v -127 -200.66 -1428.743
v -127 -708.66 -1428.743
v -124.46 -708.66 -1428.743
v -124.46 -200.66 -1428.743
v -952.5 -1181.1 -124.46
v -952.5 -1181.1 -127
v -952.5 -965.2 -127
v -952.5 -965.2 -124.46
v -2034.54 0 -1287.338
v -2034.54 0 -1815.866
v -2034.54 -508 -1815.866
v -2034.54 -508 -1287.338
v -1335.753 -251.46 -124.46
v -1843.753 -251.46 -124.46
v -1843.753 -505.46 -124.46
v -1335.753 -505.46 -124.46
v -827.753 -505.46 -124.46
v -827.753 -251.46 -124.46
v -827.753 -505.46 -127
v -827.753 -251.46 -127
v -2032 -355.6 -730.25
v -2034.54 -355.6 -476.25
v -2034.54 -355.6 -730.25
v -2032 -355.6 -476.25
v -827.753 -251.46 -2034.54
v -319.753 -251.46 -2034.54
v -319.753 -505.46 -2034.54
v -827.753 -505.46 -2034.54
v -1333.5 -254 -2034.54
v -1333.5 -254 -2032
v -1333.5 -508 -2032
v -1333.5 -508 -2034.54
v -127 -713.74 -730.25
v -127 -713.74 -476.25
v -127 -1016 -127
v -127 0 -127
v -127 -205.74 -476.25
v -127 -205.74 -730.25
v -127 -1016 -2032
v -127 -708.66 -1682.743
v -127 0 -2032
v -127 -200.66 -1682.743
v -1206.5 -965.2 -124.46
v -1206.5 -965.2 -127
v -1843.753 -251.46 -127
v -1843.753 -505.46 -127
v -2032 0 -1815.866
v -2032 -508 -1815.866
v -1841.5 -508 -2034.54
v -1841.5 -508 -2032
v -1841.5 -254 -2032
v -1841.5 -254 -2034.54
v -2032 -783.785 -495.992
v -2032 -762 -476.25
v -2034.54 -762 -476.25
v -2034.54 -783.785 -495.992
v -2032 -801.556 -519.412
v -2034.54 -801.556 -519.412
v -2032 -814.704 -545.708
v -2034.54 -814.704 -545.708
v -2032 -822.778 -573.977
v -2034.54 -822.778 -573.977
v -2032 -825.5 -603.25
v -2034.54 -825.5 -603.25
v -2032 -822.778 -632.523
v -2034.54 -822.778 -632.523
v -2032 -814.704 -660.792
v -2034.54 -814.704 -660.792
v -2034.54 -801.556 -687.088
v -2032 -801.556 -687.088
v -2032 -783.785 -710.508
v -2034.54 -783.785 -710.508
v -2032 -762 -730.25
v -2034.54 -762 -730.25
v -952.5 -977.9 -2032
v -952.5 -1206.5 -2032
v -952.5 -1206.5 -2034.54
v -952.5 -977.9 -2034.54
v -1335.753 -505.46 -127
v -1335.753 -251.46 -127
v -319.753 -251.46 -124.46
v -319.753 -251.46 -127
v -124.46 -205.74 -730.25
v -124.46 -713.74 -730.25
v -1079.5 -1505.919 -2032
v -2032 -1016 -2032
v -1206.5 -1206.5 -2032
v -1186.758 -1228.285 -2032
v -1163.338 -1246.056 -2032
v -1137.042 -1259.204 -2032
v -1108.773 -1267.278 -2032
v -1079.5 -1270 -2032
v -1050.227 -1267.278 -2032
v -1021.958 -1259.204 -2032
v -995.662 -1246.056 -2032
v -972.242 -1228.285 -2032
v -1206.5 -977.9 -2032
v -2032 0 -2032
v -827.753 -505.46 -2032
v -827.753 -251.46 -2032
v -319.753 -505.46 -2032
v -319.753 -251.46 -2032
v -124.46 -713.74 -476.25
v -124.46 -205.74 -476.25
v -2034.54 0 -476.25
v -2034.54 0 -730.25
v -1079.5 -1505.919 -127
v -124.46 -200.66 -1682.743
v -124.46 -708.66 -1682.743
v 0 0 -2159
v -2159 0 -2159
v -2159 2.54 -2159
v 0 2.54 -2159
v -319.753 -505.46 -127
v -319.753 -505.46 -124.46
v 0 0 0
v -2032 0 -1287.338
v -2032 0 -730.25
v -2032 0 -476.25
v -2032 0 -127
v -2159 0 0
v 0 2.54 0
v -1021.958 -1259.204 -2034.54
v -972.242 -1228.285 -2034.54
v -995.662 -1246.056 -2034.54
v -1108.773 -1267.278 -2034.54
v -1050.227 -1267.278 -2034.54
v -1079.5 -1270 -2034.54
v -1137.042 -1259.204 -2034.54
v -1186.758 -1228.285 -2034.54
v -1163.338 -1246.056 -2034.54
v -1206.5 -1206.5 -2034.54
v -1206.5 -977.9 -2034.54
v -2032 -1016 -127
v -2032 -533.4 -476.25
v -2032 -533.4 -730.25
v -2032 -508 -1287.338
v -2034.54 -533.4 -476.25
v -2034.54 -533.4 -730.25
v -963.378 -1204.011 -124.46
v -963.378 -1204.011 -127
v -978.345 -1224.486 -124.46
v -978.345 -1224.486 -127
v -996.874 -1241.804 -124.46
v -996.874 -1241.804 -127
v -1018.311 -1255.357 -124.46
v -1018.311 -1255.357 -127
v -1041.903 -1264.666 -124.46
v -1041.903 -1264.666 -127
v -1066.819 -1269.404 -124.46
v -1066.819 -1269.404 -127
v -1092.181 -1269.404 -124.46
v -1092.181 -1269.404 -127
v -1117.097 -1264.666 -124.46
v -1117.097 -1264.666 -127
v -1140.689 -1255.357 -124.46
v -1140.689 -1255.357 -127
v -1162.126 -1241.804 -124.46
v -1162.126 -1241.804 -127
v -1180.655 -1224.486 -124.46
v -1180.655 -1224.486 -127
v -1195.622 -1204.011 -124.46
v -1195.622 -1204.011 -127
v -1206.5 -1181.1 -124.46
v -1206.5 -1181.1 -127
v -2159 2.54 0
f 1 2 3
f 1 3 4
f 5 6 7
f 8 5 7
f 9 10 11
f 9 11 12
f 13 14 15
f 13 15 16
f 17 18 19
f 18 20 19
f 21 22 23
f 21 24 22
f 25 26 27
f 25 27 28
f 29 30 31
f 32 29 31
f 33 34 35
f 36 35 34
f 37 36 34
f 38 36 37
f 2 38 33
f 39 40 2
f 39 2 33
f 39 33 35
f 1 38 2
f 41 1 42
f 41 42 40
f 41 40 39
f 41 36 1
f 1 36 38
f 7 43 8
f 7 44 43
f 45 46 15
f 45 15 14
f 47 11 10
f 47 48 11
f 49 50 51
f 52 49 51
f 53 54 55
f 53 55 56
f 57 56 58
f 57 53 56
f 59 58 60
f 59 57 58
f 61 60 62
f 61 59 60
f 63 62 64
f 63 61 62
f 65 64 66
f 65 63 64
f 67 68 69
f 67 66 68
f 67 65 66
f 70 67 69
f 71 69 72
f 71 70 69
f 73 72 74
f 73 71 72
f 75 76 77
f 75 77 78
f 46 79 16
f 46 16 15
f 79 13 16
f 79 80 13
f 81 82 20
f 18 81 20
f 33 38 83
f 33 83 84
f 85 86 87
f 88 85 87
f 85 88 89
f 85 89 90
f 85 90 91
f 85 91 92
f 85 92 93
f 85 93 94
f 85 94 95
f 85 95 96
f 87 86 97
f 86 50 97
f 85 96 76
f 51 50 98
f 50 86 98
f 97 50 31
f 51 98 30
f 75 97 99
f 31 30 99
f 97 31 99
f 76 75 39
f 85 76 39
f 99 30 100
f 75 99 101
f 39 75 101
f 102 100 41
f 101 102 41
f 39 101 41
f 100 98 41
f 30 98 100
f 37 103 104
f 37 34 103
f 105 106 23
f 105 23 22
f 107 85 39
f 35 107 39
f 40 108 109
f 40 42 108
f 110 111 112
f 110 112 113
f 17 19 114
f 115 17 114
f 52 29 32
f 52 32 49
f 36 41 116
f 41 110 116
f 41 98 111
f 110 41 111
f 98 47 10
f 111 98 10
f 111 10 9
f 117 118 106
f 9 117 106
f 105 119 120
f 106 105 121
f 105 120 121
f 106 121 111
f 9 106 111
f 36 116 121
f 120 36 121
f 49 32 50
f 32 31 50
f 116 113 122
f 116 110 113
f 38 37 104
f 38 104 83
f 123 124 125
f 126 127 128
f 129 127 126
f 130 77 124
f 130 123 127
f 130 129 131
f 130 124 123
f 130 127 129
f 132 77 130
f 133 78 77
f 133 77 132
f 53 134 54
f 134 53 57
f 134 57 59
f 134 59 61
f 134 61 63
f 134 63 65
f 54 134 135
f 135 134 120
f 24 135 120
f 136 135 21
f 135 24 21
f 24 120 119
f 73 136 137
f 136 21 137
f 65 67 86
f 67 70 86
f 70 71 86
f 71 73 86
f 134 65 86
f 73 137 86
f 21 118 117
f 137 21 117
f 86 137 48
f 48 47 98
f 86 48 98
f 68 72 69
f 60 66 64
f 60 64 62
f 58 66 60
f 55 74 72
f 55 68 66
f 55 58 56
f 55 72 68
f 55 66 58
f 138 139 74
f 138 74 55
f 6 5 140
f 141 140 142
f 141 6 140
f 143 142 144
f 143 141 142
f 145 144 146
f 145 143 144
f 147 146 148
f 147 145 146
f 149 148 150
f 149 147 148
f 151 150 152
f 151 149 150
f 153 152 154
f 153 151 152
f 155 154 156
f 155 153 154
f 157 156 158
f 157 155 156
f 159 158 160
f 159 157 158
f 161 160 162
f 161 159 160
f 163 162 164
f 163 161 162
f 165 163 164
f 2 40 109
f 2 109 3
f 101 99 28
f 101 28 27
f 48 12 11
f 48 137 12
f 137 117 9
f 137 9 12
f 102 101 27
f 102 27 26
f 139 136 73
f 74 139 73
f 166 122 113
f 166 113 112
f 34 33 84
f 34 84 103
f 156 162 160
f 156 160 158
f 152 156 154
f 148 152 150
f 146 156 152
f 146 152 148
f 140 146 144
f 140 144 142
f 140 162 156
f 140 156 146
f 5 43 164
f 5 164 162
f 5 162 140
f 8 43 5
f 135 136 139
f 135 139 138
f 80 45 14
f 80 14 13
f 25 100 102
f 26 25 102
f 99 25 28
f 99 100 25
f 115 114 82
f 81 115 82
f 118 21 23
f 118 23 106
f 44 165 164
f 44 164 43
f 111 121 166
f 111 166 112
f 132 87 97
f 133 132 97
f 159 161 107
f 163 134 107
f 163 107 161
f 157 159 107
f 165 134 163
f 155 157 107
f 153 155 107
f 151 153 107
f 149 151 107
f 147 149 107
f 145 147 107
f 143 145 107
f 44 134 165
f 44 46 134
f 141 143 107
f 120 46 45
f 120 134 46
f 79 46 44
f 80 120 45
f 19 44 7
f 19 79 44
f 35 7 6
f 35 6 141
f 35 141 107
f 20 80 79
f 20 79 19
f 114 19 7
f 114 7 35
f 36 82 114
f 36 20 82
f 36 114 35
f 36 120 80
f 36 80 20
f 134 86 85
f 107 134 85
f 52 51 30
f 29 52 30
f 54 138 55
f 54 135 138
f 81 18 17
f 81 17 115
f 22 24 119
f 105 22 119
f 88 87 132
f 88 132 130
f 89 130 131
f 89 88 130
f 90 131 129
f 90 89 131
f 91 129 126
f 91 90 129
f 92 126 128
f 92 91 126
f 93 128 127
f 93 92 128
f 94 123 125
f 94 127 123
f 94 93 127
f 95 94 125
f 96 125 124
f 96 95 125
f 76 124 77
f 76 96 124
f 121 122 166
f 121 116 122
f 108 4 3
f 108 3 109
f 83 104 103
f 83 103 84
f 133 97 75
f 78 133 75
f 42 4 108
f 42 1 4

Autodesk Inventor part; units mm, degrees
ref_plane "YZ Plane" through (0, 0, 0) normal (1, 0, 0) x (0, 1, 0)
ref_plane "XZ Plane" through (0, 0, 0) normal (0, 1, 0) x (-1, 0, 0)
ref_plane "XY Plane" through (0, 0, 0) normal (0, 0, 1) x (1, 0, 0)
sketch "Sketch2" plane through (0, 0, 0) normal (0, 1, 0) x (-1, 0, 0)
  line L0 (0, 0) -> (2159, 0)
  line L1 (2159, 0) -> (2159, -2159)
  line L2 (2159, -2159) -> (0, -2159)
  line L3 (0, -2159) -> (0, 0)
  dimension "d3" = 2159
  dimension "d4" = 2159
  dimension "d5" = 2159
  dimension "d6" = 2159
sketch "Sketch4" plane through (0, 0, 0) normal (0, 1, 0) x (-1, 0, 0)
  line L0 (0, 0) -> (0, -127)
  line L1 (2032, -127) -> (2032, -2032)
  line L2 (2032, -127) -> (127, -127)
  line L3 (127, -127) -> (127, -2032)
  line L4 (2032, -2032) -> (127, -2032)
  dimension "d16" = 127
  dimension "d17" = 2032
  dimension "d18" = 1905
  dimension "d20" = 1905
  dimension "d21" = 1905
extrude "Extrusion3" add sketch "Sketch4" against normal blind 1016
sketch "Sketch5" plane through (-127, 0, -2032) normal (0, 0, -1) x (-1, 0, 0)
  point P0 (-127, 0)
sketch "Sketch6" plane through (-2032, 0, -2032) normal (-1, 0, 0) x (0, 0, 1)
  line L0 (0, 0) -> (952.5, 0)
  line L1 (1905, 0) -> (0, 0) projected
  line L2 (952.5, 0) -> (952.5, -1016)
  line L3 (1905, -1016) -> (0, -1016) projected
  line L4 (952.5, 0) -> (1428.75, 0)
  line L5 (1428.75, 0) -> (1428.75, -355.6)
  line L6 (744.6615, 0) -> (744.6615, -508)
  line L7 (744.6615, -508) -> (216.1341, -508)
  line L8 (216.1341, -508) -> (216.1341, 0)
  line L9 (1428.75, -355.6) -> (1301.75, -355.6)
  line L10 (1301.75, -355.6) -> (1301.75, 0)
  line L11 (1428.75, -355.6) -> (1555.75, -355.6)
  line L12 (1555.75, -355.6) -> (1555.75, 0)
  point P0 (2032, 0)
  dimension "d24" = 476.25
  dimension "d25" = 355.6
  dimension "d26" = 127
  dimension "d27" = 127
extrude "Extrusion4" add sketch "Sketch6" along normal blind 2.54 contours L1 L5 L9 L10 | L1 L12 L11 L5
extrude "Extrusion5" add sketch "Sketch6" along normal blind 2.54 contours L0 L6 L7 L8
sketch "Sketch7" plane through (-127, 0, -2032) normal (0, 0, -1) x (-1, 0, 0)
  line L0 (1905, 0) -> (1905, -1016) projected
  line L1 (1905, 0) -> (0, 0) projected
  line L2 (952.5, 0) -> (952.5, -2181.7197)
  line L3 (1905, -1016) -> (952.5, -1505.9188)
  line L4 (1905, -1016) -> (0, -1016) projected
  line L5 (952.5, -1505.9188) -> (0, -1016)
  line L6 (1905, -1016) -> (0, -1016)
  point P0 (-127, 0)
extrude "Extrusion6" add sketch "Sketch7" against normal blind 1905 contours L3 L2 L4 | L5 L4 L2
extrude "Extrusion7" add sketch "Sketch2" along normal blind 2.54
sketch "Sketch9" plane through (-2032, 0, -127) normal (0, 0, 1) x (1, 0, 0)
  line L0 (-127, 2.54) -> (2032, 2.54) projected
  line L1 (-2.2534, 2.54) -> (950.2466, 2.54)
  line L2 (950.2466, 2.54) -> (950.2466, -864.9635)
  line L3 (950.2466, 2.54) -> (950.2466, -251.46)
  line L4 (950.2466, -251.46) -> (950.2466, -505.46)
  line L5 (696.2466, -251.46) -> (696.2466, -505.46)
  line L6 (696.2466, -505.46) -> (188.2466, -505.46)
  line L7 (188.2466, -505.46) -> (188.2466, -251.46)
  line L8 (188.2466, -251.46) -> (696.2466, -251.46)
  line L9 (1204.2466, -251.46) -> (1204.2466, -505.46)
  line L10 (1204.2466, -505.46) -> (1712.2466, -505.46)
  line L11 (1712.2466, -505.46) -> (1712.2466, -251.46)
  line L12 (1712.2466, -251.46) -> (1204.2466, -251.46)
  point P0 (2032, 0)
  dimension "d40" = 952.5
  dimension "d41" = 254
  dimension "d46" = 254
  dimension "d47" = 508
  dimension "d48" = 254
  dimension "d49" = 254
  dimension "d51" = 508
  dimension "d52" = 254
extrude "Extrusion8" add sketch "Sketch9" along normal blind 2.54
sketch "Sketch10" plane through (-2032, 0, -127) normal (0, 0, 1) x (1, 0, 0)
  line L0 (0, 0) -> (0, -355.6) projected
  line L1 (0, 0) -> (952.5, 0)
  line L2 (1905, 0) -> (0, 0) projected
  line L3 (952.5, 0) -> (952.5, -1143)
  line L4 (952.5, -1143) -> (952.5, -1270)
  line L5 (825.5, -965.2) -> (1079.5, -965.2)
  arc A0 (825.5, -1181.1) -> (1079.5, -1181.1) centre (952.5, -1134.8357) ccw
  line L6 (1079.5, -1181.1) -> (1079.5, -965.2)
  line L7 (825.5, -1181.1) -> (825.5, -965.2)
  point P0 (2032, 0)
  dimension "d55" = 952.5
  dimension "d56" = 1143
  dimension "d58" = 127
extrude "Extrusion9" add sketch "Sketch10" along normal blind 2.54
sketch "Sketch11" plane through (-127, -1016, -127) normal (1, 0, 0) x (0, 0, -1)
  line L0 (0, 1016) -> (349.25, 1016) projected
  line L1 (0, 1016) -> (476.25, 1016)
  line L2 (476.25, 1016) -> (952.5, 1016)
  line L3 (952.5, 1016) -> (1428.7432, 1018.54)
  line L4 (2032, 1018.54) -> (-127, 1018.54) projected
  line L5 (1905, 1016) -> (1905, 0) projected
  line L6 (1428.7432, 1018.54) -> (1905, 1016)
  line L7 (1428.7432, 1018.54) -> (1428.7432, 0)
  line L8 (952.5, 1016) -> (952.5, 0)
  line L9 (476.25, 1016) -> (476.25, 0)
  line L10 (1428.7432, 1018.54) -> (1428.7432, 815.34)
  line L11 (1428.7432, 815.34) -> (1555.7432, 815.34)
  line L12 (1555.7432, 815.34) -> (1555.7432, 307.34)
  line L13 (1555.7432, 307.34) -> (1301.7432, 307.34)
  line L14 (1301.7432, 307.34) -> (1301.7432, 815.34)
  line L15 (1428.7432, 815.34) -> (1301.7432, 815.34)
  line L16 (476.25, 1013.46) -> (476.25, 810.26)
  line L17 (476.25, 810.26) -> (603.25, 810.26)
  line L18 (603.25, 810.26) -> (603.25, 302.26)
  line L19 (603.25, 302.26) -> (349.25, 302.26)
  line L20 (476.25, 810.26) -> (349.25, 810.26)
  line L21 (-127, 1016) -> (-127, 1018.54) projected
  line L22 (349.25, 302.26) -> (349.25, 810.26)
  dimension "d66" = 476.25
  dimension "d67" = 476.25
  dimension "d68" = 476.25
  dimension "d70" = 127
  dimension "d74" = 254
  dimension "d75" = 508
  dimension "d76" = 203.2
  dimension "d77" = 127
  dimension "d78" = 508
  dimension "d79" = 254
  dimension "d80" = 127
extrude "Extrusion10" add sketch "Sketch11" along normal blind 2.54
sketch "Sketch13" plane through (-127, 0, -2032) normal (0, 0, -1) x (-1, 0, 0)
  line L0 (1905, 0) -> (952.5, 0)
  line L1 (1905, 0) -> (0, 0) projected
  line L2 (700.7534, -251.46) -> (700.7534, -505.46) projected
  line L3 (700.7534, -251.46) -> (700.7534, -505.46)
  line L4 (700.7534, -505.46) -> (192.7534, -505.46)
  line L5 (192.7534, -505.46) -> (192.7534, -251.46)
  line L6 (700.7534, -251.46) -> (192.7534, -251.46)
  line L7 (1206.5, -254) -> (1206.5, -508)
  line L8 (1206.5, -508) -> (1714.5, -508)
  line L9 (1714.5, -508) -> (1714.5, -254)
  line L10 (1714.5, -254) -> (1206.5, -254)
  line L11 (952.5, 0) -> (952.5, -1270)
  line L12 (952.5, -1270) -> (1079.5, -1270)
  line L13 (1079.5, -1270) -> (1079.5, -977.9)
  line L14 (952.5, -1270) -> (825.5, -1270)
  line L15 (825.5, -1270) -> (825.5, -977.9)
  line L16 (1079.5, -977.9) -> (825.5, -977.9)
  line L17 (1079.5, -1270) -> (1079.5, -1206.5)
  line L18 (825.5, -1270) -> (825.5, -1206.5)
  arc A0 (825.5, -1206.5) -> (1079.5, -1206.5) centre (952.5, -1111.25) ccw
  point P0 (-127, 0)
  dimension "d83" = 952.5
  dimension "d87" = 508
  dimension "d88" = 254
  dimension "d89" = 254
  dimension "d90" = 508
  dimension "d91" = 254
  dimension "d92" = 1270
  dimension "d93" = 127
  dimension "d94" = 292.1
  dimension "d95" = 127
  dimension "d96" = 292.1
  dimension "d98" = 63.5
  dimension "d99" = 63.5
extrude "Extrusion11" add sketch "Sketch13" along normal blind 2.54 contours L2 L4 L5 L6 | L10 L9 L8 L7 | L16 L13 A0 L11 | L11 A0 L15 L16
sketch "Sketch14" plane through (-2032, -355.6, -730.25) normal (-1, 0, 0) x (0, 0, 1)
  line L0 (-1301.75, 355.6) -> (603.25, 355.6) projected
  line L1 (-349.25, 355.6) -> (-349.25, -406.4)
  line L2 (0, 0) -> (254, 0) projected
  line L3 (0, -177.8) -> (-349.25, -177.8)
  line L4 (0, -177.8) -> (0, -406.4)
  line L5 (0, -177.8) -> (254, -177.8)
  line L6 (254, -177.8) -> (254, -406.4)
  line L7 (127, -177.8) -> (127, -469.9)
  arc A0 (0, -406.4) -> (254, -406.4) centre (127, -311.15) ccw
  point P0 (730.25, 355.6)
  dimension "d102" = 762
  dimension "d109" = 228.6
  dimension "d110" = 254
  dimension "d111" = 228.6
  dimension "d112" = 292.1
extrude "Extrusion12" add sketch "Sketch14" along normal blind 2.54
properties part number "Parthouer"
